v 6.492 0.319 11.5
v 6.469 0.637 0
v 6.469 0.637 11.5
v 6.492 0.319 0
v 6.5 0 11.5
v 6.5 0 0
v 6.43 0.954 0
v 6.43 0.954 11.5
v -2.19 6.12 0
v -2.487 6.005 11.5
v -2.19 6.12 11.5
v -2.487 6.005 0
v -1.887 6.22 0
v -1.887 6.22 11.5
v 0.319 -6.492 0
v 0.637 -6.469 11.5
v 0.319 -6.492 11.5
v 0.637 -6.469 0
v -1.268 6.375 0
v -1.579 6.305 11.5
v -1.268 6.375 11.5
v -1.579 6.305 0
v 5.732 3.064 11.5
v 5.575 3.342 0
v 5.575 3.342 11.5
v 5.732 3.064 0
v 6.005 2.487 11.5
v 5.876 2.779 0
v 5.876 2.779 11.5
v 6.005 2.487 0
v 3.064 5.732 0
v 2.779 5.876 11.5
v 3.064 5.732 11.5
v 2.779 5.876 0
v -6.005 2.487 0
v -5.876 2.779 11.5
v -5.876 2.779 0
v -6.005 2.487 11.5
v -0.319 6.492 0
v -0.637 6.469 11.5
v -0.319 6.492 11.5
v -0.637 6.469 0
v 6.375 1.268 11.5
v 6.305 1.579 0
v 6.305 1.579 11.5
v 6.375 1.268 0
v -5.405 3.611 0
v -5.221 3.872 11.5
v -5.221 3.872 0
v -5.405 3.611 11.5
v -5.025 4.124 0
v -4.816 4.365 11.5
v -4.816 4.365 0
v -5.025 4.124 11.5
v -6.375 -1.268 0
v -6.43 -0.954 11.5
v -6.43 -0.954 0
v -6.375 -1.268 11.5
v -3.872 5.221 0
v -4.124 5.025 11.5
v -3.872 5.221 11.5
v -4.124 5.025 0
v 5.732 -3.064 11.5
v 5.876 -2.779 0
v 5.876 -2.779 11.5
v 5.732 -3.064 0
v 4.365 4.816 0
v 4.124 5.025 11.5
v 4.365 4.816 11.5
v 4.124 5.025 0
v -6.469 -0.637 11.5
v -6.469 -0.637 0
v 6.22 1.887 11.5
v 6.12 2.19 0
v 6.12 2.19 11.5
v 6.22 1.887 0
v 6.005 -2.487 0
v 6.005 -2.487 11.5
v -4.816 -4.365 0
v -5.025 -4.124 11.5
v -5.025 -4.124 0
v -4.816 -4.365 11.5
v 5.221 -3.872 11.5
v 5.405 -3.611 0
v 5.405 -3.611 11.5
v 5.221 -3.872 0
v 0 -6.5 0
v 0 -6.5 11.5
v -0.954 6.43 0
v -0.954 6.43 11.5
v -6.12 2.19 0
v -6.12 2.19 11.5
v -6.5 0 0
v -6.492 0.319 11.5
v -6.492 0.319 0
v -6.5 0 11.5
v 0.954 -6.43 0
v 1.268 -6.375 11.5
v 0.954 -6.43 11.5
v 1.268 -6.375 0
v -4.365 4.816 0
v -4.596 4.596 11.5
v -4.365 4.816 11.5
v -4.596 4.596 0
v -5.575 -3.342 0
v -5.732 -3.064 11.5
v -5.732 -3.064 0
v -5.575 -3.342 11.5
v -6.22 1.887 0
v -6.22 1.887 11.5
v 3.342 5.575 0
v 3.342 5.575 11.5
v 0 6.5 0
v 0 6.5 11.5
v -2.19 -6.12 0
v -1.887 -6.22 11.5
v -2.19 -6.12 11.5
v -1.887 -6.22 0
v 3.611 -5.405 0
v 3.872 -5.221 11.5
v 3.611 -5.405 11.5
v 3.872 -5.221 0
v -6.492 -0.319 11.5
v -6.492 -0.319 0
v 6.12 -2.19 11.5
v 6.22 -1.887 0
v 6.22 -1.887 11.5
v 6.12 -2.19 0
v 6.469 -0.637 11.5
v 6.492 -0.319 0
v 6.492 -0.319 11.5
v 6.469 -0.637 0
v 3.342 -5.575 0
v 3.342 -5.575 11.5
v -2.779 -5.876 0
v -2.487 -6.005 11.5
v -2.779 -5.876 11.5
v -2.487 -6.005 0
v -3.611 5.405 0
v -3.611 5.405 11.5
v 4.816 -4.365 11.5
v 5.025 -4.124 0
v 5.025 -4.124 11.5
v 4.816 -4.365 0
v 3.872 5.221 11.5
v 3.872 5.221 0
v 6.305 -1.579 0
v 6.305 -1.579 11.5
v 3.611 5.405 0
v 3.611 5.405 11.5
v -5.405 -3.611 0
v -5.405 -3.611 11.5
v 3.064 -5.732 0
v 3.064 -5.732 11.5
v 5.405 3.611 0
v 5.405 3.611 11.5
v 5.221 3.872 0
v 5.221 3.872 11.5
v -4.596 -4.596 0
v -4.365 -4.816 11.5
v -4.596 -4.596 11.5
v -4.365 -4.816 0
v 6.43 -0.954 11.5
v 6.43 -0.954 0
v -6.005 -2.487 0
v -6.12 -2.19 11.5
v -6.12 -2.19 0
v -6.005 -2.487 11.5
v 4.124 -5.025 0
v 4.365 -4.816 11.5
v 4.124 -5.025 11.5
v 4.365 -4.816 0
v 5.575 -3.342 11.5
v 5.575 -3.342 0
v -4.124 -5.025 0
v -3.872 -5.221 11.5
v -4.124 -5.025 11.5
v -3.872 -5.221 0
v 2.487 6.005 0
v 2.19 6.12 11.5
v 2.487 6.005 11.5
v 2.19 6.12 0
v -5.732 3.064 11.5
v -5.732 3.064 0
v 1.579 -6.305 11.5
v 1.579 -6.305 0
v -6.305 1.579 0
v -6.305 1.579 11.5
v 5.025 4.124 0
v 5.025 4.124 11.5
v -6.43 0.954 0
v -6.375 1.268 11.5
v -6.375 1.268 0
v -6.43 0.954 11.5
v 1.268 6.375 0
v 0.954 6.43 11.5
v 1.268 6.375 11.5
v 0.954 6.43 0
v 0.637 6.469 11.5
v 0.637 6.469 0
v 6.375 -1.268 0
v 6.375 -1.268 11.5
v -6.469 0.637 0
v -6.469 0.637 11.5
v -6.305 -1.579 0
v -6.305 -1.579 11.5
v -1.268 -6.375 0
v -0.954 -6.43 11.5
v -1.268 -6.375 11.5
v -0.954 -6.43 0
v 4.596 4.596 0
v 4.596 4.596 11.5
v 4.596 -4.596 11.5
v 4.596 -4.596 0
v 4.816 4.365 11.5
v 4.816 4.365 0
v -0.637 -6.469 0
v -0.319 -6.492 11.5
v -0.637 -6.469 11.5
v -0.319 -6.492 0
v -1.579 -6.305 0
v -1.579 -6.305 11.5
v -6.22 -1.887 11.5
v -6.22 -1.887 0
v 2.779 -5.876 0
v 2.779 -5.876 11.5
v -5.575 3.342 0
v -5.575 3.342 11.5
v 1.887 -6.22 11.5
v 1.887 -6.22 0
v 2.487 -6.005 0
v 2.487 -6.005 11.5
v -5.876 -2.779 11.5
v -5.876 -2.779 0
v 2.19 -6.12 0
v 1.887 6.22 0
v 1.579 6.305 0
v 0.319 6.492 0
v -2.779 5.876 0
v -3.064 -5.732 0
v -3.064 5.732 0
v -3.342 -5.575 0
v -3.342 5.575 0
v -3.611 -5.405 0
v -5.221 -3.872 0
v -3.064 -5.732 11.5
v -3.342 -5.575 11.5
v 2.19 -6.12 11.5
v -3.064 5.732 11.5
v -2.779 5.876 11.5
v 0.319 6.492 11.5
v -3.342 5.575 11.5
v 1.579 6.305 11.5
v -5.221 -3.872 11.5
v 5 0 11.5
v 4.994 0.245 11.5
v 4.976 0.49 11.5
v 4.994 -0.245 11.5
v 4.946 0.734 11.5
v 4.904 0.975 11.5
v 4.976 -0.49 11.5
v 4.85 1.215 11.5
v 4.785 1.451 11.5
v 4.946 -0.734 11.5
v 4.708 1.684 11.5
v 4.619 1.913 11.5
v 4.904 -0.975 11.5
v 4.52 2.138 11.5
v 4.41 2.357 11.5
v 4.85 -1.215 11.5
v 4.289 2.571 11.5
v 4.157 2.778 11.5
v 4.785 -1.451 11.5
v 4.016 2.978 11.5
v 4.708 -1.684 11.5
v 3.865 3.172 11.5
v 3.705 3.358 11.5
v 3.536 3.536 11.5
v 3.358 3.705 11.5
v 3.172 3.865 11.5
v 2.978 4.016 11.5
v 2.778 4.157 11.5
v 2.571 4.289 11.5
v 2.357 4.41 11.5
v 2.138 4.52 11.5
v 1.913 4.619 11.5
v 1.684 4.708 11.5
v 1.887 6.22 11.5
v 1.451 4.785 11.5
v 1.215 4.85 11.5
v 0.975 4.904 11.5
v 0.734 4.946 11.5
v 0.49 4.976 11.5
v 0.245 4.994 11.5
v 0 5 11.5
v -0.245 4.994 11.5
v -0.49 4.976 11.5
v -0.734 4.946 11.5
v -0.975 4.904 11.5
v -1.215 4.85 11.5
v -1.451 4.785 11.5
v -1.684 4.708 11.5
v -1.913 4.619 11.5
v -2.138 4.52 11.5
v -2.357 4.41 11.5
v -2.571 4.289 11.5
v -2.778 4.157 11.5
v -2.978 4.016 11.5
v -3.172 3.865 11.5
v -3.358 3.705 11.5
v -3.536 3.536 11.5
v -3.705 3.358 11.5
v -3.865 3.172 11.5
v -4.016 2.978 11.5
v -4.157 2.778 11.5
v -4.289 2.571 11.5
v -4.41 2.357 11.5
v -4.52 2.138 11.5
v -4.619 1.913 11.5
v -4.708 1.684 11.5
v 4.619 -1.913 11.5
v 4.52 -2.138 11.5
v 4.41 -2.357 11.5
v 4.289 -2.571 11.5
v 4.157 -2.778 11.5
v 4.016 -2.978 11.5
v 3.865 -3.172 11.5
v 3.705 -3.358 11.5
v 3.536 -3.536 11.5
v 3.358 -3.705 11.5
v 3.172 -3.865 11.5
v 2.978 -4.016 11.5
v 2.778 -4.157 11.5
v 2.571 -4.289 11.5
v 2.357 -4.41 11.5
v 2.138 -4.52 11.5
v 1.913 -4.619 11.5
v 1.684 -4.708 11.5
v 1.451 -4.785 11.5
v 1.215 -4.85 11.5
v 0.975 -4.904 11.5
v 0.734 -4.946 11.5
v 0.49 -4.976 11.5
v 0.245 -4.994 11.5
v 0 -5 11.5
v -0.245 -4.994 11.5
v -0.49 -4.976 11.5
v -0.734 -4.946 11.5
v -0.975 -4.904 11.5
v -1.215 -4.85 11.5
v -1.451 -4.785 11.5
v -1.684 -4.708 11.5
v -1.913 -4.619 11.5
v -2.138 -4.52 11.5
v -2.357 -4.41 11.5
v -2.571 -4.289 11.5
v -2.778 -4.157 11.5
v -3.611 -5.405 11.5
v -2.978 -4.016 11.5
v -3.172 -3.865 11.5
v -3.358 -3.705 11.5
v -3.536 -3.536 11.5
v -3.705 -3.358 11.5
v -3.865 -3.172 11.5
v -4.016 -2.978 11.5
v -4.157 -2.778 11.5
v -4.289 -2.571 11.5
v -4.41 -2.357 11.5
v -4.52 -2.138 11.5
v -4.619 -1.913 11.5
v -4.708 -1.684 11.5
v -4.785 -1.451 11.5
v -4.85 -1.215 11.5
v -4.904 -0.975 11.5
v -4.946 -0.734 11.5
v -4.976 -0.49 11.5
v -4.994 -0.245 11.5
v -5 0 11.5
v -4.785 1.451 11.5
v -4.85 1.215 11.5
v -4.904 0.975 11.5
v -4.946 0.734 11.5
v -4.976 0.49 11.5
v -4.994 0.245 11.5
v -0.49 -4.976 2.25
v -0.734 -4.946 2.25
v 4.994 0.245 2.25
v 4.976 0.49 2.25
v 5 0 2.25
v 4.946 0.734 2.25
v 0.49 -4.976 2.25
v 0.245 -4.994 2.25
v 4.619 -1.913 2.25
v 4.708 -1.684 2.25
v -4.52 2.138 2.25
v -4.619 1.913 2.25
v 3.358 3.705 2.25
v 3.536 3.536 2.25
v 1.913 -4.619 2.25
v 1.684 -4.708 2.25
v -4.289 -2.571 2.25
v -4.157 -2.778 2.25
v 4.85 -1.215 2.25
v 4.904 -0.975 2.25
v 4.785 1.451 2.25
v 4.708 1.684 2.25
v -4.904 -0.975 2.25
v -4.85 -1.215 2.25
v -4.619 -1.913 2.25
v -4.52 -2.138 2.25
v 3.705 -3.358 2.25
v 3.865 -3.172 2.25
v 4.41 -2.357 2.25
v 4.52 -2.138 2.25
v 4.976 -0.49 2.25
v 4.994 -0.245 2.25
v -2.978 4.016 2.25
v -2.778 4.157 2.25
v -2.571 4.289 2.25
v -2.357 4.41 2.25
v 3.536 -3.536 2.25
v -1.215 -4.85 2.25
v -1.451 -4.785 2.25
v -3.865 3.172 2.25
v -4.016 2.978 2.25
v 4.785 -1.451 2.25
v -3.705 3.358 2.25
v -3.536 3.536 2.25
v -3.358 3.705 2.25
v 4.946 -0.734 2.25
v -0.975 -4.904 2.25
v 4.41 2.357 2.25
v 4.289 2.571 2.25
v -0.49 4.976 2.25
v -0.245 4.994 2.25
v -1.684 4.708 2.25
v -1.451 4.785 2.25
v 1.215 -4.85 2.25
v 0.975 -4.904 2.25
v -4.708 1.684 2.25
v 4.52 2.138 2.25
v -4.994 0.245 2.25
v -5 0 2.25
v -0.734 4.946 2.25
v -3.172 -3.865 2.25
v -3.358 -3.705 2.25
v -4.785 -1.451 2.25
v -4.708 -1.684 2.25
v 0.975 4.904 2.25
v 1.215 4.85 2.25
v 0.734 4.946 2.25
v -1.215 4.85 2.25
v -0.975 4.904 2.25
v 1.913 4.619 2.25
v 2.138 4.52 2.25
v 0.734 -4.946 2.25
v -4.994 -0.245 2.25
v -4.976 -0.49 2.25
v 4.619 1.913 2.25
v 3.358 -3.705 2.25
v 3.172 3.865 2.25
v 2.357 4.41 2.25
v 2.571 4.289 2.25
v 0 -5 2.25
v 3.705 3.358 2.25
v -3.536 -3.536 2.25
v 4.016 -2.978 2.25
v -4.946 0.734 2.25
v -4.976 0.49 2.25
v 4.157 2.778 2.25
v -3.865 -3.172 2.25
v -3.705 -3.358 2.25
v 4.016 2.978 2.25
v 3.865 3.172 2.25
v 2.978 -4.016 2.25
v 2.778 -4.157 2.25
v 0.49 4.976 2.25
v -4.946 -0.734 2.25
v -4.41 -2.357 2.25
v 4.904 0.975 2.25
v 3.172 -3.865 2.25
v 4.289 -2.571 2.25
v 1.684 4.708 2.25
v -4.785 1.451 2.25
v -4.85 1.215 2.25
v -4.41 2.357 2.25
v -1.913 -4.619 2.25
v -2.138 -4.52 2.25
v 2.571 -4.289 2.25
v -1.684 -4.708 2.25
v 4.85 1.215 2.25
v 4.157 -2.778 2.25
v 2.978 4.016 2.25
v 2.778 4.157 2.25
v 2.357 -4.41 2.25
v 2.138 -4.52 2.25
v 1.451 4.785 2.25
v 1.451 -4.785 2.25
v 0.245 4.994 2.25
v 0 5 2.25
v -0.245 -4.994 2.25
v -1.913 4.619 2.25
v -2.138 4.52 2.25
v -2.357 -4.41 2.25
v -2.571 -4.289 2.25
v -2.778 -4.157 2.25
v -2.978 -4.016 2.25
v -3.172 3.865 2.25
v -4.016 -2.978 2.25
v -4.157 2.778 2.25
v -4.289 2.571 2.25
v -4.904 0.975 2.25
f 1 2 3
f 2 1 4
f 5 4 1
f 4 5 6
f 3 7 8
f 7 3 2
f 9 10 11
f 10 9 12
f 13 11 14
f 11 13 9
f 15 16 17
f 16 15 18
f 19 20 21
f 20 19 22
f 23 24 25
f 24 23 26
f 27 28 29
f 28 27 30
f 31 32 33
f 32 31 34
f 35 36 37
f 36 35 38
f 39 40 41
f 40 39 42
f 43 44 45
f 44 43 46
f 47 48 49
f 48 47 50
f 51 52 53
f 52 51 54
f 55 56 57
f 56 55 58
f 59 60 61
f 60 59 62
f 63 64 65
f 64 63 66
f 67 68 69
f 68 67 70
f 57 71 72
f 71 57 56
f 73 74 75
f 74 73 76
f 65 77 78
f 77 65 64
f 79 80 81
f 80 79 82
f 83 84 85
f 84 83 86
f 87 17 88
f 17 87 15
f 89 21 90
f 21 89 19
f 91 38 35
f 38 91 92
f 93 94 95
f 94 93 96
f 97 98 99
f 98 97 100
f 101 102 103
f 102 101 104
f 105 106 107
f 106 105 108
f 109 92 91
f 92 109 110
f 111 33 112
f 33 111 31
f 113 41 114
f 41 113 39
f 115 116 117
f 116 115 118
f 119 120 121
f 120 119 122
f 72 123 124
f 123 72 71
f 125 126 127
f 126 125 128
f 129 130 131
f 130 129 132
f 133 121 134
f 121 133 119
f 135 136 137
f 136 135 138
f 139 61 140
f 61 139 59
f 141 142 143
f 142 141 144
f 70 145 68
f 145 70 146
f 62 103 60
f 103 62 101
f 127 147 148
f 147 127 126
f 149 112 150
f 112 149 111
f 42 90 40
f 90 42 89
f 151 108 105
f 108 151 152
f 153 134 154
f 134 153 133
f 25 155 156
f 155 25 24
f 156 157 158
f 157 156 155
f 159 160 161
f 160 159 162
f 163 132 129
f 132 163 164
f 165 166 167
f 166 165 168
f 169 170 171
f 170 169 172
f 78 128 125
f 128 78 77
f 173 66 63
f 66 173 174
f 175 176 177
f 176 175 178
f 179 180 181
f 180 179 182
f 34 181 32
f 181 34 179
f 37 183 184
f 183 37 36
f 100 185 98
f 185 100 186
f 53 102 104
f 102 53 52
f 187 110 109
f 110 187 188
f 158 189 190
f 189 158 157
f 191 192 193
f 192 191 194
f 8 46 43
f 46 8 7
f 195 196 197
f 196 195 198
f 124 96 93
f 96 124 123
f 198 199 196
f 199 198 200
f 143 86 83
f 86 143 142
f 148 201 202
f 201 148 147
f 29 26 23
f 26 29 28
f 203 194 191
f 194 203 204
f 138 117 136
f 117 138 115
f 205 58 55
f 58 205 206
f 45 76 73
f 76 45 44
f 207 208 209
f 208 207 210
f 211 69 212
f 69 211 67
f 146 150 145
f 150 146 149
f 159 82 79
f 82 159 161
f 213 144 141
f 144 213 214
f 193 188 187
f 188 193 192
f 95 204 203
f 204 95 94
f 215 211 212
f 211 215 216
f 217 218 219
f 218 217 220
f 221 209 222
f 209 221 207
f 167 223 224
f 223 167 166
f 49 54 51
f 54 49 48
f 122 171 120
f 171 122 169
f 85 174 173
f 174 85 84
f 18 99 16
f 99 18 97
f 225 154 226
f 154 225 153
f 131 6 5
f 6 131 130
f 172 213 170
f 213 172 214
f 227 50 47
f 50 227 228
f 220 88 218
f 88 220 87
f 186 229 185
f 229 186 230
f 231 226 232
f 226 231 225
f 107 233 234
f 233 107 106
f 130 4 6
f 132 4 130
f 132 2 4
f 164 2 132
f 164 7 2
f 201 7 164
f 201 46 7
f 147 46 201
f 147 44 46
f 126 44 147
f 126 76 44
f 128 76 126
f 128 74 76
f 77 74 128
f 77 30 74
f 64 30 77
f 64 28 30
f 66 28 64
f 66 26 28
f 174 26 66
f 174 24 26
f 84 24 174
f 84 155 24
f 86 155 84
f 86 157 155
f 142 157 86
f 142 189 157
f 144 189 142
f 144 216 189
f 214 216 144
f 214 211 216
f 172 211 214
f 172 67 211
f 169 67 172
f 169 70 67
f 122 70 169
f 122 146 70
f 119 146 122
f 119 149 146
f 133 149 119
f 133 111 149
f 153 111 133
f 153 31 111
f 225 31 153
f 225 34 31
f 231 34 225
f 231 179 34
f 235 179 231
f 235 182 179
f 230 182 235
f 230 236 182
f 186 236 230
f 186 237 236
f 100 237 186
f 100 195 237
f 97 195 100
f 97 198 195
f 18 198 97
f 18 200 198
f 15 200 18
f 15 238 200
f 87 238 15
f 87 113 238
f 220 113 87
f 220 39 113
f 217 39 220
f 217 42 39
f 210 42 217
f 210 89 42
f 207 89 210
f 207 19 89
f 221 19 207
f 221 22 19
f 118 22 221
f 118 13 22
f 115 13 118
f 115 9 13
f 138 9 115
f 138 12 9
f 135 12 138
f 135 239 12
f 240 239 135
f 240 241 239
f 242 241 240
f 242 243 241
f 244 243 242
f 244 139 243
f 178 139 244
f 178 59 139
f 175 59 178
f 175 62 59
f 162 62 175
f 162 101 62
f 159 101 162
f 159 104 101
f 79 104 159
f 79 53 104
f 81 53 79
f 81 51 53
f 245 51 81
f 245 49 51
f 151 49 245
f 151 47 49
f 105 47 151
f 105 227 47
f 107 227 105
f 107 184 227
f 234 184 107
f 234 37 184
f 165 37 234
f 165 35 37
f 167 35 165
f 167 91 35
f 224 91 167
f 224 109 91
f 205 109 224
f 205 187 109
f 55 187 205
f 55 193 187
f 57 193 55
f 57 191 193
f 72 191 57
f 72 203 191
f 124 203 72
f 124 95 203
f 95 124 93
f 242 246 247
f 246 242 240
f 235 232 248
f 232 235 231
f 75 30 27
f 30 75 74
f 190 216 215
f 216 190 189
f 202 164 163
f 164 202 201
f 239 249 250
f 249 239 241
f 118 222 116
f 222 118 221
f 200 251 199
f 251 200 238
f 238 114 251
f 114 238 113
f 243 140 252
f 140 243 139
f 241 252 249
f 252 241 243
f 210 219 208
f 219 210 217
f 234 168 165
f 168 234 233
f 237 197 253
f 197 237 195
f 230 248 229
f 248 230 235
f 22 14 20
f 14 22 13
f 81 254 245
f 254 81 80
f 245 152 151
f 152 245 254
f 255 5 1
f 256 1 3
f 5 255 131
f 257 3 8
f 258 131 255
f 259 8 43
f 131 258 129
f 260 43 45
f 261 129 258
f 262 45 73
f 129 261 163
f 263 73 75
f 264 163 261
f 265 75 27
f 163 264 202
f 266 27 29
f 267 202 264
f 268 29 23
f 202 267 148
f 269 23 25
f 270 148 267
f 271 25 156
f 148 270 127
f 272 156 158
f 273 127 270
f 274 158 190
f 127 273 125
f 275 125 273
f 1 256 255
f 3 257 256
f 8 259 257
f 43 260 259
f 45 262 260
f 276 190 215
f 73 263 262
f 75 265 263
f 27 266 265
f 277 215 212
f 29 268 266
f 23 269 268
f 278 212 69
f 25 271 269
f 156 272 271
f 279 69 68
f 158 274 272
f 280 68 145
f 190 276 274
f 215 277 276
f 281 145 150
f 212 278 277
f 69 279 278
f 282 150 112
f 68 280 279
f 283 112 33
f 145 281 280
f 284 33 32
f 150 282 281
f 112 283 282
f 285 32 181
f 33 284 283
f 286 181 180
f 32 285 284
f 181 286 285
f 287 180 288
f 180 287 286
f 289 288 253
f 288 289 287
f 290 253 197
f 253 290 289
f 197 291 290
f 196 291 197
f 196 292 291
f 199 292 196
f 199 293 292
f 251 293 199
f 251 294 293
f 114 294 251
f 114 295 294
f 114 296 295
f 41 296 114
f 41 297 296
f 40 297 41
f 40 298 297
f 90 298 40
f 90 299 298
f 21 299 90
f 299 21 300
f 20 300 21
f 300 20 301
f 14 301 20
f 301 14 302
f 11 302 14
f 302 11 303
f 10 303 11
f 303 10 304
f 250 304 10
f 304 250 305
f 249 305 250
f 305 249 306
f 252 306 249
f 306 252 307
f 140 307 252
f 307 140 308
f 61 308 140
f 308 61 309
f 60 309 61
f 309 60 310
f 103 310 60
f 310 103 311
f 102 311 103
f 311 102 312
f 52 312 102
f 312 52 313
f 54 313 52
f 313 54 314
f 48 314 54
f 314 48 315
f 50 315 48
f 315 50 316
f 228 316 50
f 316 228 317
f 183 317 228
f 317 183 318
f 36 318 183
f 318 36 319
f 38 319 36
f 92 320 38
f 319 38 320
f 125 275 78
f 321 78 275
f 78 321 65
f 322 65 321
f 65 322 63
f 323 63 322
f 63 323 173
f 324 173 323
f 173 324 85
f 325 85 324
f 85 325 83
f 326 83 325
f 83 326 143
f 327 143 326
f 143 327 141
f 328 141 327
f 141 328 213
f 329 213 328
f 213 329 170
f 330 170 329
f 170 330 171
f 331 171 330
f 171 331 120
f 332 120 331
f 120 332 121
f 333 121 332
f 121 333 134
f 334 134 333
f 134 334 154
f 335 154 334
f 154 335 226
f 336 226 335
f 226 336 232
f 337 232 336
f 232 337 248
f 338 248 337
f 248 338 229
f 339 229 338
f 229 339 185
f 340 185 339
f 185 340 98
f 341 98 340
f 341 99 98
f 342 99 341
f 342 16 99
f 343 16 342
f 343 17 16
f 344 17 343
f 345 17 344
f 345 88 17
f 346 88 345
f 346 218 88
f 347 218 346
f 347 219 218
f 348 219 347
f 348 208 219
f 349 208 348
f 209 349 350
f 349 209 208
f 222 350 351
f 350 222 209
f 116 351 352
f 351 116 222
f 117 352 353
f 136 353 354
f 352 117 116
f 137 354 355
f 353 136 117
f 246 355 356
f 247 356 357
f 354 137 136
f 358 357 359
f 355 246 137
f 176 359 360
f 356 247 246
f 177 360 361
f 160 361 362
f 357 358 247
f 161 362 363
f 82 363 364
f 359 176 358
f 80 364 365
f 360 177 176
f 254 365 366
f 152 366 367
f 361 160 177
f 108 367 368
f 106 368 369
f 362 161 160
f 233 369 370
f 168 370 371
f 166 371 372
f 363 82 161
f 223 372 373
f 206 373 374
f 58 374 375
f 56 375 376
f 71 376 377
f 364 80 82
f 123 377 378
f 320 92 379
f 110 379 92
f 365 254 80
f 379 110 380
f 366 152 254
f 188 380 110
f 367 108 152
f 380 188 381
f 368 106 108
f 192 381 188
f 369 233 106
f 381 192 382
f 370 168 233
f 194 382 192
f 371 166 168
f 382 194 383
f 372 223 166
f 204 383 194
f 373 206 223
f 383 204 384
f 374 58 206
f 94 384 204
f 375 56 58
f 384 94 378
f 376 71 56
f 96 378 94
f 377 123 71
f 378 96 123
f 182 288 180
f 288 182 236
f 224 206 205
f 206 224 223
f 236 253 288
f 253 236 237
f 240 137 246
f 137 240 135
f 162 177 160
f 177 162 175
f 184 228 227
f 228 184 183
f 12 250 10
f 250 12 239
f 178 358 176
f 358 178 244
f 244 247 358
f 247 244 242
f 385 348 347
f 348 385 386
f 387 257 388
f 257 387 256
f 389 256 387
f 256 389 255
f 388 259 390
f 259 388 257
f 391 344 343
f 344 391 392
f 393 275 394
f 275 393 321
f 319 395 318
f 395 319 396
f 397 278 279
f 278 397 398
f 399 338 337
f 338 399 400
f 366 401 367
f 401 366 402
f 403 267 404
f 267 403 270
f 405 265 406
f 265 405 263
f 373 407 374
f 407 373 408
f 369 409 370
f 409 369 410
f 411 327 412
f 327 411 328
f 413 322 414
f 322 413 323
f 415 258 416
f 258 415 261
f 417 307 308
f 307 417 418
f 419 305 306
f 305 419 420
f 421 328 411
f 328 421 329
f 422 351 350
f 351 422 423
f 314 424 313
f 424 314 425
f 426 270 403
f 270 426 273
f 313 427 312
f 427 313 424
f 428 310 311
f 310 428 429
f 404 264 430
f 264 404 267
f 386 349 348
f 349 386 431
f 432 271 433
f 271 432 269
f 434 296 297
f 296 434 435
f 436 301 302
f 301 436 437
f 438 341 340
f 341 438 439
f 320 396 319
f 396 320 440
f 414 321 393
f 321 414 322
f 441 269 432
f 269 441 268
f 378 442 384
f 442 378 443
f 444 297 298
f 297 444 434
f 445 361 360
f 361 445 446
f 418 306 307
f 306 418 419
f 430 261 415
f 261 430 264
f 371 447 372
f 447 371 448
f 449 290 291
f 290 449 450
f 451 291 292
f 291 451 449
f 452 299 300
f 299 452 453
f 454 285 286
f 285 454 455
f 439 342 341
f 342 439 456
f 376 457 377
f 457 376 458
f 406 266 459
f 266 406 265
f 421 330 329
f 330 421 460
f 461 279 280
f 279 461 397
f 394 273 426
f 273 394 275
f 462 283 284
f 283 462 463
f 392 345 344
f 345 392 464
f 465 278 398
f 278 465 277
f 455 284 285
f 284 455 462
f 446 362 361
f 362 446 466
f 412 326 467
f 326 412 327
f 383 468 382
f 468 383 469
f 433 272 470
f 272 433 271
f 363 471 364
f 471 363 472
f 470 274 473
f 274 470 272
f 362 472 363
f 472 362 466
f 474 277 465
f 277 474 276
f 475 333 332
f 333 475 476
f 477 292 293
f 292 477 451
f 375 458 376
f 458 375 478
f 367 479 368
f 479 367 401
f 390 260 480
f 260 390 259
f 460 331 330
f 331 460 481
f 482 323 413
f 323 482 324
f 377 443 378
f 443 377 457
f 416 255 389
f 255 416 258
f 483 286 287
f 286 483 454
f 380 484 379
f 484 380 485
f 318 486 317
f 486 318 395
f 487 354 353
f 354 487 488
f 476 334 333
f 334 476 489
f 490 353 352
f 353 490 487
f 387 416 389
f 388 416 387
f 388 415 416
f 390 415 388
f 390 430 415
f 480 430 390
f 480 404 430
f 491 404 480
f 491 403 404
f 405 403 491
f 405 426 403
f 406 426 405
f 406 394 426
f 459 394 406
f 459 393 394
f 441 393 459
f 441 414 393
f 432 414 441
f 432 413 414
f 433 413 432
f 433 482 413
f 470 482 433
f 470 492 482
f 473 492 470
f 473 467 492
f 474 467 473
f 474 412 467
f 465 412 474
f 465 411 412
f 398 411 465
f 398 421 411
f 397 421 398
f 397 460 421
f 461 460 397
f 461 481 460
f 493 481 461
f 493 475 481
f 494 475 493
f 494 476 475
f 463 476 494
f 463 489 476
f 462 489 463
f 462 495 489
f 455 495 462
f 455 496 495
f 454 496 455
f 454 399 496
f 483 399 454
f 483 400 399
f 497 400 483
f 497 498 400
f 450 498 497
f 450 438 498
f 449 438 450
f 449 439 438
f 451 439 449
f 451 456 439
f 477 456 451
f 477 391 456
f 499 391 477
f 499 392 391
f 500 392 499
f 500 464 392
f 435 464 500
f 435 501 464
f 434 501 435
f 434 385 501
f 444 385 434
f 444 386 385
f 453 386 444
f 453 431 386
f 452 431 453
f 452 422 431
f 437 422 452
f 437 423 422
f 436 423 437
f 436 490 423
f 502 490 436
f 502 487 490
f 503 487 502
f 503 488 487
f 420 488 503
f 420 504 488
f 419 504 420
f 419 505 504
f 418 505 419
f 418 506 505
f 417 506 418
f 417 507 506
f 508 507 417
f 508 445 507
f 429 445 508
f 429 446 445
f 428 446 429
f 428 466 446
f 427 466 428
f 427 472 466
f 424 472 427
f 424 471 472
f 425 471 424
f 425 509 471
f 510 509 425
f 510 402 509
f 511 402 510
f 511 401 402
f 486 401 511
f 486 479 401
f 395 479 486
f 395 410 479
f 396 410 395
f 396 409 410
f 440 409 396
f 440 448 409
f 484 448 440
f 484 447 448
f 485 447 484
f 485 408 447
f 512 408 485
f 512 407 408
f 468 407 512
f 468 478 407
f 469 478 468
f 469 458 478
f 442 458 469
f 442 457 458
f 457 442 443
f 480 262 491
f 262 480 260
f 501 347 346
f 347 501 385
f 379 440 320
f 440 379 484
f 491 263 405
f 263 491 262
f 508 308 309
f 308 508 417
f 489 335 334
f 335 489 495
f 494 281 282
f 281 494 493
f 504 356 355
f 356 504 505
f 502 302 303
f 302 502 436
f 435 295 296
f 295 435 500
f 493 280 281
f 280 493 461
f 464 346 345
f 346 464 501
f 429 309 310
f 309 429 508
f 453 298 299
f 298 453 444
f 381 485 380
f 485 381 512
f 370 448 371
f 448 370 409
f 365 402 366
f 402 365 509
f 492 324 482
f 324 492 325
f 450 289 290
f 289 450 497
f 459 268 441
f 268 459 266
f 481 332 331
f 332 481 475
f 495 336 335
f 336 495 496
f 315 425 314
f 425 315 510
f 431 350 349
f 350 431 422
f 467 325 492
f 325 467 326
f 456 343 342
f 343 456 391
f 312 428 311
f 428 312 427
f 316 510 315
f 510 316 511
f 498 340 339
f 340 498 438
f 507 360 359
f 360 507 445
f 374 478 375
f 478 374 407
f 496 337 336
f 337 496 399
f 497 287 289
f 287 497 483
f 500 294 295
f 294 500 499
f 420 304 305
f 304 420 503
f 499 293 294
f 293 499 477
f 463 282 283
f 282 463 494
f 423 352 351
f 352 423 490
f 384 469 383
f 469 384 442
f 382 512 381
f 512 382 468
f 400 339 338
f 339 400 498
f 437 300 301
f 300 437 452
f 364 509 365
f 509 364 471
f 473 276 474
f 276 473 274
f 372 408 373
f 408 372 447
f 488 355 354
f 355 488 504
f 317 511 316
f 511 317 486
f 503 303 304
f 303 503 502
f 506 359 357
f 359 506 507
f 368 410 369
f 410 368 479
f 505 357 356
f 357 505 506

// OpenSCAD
$fn=128;
height=11.5;
thickness=1.5;
inner_diam=10;

difference() {
translate([0,0,height/2]) cylinder(h=height, d=inner_diam+2*thickness, center=true);

translate([0,0,height/2 + thickness]) cylinder(h=height-thickness, d=inner_diam, center=true);
}
